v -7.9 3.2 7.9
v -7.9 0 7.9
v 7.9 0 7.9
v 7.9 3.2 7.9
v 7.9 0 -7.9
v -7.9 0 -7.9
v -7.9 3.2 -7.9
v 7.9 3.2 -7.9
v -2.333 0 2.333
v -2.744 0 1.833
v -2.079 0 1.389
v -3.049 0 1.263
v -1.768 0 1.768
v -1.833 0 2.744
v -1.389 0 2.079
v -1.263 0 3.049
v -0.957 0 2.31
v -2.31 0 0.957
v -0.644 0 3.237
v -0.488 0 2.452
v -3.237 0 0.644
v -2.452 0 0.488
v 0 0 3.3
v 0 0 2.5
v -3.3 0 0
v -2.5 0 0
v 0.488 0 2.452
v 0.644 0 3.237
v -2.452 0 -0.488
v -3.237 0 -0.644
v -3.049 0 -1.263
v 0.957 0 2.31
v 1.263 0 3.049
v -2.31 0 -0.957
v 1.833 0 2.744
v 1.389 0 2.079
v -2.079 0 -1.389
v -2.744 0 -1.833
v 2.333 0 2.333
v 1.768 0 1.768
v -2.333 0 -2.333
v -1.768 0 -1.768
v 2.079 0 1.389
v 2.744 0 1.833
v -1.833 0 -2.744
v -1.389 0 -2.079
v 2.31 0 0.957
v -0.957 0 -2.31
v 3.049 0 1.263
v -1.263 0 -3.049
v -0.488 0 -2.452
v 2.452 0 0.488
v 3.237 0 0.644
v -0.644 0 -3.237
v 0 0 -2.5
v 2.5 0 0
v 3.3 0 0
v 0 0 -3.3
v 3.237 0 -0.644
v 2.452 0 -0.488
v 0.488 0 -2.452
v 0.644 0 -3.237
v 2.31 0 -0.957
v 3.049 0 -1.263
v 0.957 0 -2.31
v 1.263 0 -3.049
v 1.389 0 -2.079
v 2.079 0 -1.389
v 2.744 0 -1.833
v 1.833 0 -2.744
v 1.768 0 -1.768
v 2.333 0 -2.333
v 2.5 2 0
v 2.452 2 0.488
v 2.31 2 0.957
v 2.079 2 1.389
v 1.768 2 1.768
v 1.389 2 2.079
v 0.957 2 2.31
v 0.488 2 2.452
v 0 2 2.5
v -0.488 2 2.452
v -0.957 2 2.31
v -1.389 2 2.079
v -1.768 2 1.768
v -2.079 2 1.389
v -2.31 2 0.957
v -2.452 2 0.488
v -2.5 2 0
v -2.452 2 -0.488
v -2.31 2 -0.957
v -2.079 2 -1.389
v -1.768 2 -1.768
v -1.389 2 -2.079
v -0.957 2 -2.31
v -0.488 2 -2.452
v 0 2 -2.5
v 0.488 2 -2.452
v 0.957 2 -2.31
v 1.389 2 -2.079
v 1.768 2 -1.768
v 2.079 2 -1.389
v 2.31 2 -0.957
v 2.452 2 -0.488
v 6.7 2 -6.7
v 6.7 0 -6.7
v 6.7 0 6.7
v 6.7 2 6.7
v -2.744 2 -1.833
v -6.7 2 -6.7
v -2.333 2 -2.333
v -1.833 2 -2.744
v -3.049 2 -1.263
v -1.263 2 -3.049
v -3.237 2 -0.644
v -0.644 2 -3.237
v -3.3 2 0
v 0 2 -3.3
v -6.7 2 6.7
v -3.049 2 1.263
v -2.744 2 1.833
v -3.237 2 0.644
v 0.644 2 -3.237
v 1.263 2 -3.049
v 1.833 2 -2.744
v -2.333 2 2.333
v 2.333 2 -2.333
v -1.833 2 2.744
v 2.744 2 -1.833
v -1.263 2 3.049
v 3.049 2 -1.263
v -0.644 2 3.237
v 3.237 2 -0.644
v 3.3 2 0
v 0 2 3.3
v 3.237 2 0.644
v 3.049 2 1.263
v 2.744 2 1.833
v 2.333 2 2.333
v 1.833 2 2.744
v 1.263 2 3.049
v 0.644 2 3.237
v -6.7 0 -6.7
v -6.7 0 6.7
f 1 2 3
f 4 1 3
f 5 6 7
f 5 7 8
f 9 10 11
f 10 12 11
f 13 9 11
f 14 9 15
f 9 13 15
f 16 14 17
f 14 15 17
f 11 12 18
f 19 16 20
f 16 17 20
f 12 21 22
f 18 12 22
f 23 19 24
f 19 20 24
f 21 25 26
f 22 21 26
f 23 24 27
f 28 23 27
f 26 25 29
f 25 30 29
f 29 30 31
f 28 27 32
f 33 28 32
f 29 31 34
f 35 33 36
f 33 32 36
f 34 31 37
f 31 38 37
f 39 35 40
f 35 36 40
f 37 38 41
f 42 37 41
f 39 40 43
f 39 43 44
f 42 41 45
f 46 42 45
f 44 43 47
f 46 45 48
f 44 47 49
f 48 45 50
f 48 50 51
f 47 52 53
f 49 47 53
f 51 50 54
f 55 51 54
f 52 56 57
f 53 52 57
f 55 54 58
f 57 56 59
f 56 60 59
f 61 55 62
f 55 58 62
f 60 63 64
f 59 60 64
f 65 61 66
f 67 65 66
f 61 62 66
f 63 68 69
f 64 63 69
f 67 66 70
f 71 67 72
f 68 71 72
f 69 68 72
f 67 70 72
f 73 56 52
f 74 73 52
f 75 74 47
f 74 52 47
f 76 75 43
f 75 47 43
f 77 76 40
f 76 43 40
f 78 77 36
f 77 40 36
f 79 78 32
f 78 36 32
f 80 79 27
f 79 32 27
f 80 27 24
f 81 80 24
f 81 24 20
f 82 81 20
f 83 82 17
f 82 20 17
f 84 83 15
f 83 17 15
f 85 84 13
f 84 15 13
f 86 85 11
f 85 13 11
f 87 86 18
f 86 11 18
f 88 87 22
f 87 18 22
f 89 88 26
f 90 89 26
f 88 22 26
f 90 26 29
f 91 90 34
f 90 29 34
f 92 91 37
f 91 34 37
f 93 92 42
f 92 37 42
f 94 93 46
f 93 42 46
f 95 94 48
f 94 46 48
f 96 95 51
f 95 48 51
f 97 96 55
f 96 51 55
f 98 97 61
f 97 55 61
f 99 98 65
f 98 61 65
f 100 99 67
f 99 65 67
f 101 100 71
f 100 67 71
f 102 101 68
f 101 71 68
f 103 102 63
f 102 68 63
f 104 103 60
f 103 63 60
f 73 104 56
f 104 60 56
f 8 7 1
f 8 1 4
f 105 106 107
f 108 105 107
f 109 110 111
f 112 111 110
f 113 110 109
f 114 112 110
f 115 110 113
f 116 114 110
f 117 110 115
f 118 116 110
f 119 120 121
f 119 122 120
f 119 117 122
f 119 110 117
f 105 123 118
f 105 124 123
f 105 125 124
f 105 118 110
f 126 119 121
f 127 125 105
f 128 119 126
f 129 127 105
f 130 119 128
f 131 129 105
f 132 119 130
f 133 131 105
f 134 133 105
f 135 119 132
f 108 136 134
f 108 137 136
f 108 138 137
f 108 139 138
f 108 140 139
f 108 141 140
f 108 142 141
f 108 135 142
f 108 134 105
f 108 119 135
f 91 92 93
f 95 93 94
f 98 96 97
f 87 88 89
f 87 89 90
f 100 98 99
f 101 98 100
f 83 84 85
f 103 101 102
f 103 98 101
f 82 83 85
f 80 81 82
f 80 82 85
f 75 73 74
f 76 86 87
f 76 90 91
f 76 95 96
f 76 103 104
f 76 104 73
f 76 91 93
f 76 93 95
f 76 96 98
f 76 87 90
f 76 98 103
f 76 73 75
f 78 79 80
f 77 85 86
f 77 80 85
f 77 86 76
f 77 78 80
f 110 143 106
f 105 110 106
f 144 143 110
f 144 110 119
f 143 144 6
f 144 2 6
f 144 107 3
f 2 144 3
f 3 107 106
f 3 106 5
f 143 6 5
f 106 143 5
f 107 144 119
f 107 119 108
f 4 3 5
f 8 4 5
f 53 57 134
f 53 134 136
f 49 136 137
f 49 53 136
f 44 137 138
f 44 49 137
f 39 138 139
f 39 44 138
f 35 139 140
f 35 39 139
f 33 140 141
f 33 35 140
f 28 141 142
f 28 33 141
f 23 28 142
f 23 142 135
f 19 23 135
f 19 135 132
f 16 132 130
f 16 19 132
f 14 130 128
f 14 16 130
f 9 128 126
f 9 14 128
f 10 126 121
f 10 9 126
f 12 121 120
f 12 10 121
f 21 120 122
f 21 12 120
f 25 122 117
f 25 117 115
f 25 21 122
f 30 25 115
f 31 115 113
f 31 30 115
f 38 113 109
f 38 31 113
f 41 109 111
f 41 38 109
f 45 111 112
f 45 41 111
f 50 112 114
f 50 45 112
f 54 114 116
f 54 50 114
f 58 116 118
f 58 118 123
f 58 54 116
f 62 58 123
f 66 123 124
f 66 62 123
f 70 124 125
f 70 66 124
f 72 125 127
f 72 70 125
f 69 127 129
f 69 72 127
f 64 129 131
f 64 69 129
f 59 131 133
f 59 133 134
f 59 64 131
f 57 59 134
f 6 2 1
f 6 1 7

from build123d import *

# Parameters (mm, degrees)
SKETCH1_W          = 15.8
SKETCH1_H          = 15.8
BASE_DEPTH         = 3.2
SKETCH2_W          = 13.4
SKETCH2_H          = 13.4
SKETCH2_R          = 3.3
SKETCH2_R_2        = 2.5
CUT_EXTRUDE2_DEPTH = 2


with BuildPart() as part:
    # Sketch1 → Base (new body)
    with BuildSketch(Plane(origin=(0, 0, 0), x_dir=(1, 0, 0), z_dir=(0, 1, 0))):
        Rectangle(SKETCH1_W, SKETCH1_H)
    extrude(amount=BASE_DEPTH)

    # Sketch2 → Cut-Extrude2 (cut)
    with BuildSketch(Plane.XZ):
        Rectangle(SKETCH2_W, SKETCH2_H)
        Circle(SKETCH2_R, mode=Mode.SUBTRACT)
        Circle(SKETCH2_R_2)
    extrude(amount=-CUT_EXTRUDE2_DEPTH, mode=Mode.SUBTRACT)


solid = part.part
